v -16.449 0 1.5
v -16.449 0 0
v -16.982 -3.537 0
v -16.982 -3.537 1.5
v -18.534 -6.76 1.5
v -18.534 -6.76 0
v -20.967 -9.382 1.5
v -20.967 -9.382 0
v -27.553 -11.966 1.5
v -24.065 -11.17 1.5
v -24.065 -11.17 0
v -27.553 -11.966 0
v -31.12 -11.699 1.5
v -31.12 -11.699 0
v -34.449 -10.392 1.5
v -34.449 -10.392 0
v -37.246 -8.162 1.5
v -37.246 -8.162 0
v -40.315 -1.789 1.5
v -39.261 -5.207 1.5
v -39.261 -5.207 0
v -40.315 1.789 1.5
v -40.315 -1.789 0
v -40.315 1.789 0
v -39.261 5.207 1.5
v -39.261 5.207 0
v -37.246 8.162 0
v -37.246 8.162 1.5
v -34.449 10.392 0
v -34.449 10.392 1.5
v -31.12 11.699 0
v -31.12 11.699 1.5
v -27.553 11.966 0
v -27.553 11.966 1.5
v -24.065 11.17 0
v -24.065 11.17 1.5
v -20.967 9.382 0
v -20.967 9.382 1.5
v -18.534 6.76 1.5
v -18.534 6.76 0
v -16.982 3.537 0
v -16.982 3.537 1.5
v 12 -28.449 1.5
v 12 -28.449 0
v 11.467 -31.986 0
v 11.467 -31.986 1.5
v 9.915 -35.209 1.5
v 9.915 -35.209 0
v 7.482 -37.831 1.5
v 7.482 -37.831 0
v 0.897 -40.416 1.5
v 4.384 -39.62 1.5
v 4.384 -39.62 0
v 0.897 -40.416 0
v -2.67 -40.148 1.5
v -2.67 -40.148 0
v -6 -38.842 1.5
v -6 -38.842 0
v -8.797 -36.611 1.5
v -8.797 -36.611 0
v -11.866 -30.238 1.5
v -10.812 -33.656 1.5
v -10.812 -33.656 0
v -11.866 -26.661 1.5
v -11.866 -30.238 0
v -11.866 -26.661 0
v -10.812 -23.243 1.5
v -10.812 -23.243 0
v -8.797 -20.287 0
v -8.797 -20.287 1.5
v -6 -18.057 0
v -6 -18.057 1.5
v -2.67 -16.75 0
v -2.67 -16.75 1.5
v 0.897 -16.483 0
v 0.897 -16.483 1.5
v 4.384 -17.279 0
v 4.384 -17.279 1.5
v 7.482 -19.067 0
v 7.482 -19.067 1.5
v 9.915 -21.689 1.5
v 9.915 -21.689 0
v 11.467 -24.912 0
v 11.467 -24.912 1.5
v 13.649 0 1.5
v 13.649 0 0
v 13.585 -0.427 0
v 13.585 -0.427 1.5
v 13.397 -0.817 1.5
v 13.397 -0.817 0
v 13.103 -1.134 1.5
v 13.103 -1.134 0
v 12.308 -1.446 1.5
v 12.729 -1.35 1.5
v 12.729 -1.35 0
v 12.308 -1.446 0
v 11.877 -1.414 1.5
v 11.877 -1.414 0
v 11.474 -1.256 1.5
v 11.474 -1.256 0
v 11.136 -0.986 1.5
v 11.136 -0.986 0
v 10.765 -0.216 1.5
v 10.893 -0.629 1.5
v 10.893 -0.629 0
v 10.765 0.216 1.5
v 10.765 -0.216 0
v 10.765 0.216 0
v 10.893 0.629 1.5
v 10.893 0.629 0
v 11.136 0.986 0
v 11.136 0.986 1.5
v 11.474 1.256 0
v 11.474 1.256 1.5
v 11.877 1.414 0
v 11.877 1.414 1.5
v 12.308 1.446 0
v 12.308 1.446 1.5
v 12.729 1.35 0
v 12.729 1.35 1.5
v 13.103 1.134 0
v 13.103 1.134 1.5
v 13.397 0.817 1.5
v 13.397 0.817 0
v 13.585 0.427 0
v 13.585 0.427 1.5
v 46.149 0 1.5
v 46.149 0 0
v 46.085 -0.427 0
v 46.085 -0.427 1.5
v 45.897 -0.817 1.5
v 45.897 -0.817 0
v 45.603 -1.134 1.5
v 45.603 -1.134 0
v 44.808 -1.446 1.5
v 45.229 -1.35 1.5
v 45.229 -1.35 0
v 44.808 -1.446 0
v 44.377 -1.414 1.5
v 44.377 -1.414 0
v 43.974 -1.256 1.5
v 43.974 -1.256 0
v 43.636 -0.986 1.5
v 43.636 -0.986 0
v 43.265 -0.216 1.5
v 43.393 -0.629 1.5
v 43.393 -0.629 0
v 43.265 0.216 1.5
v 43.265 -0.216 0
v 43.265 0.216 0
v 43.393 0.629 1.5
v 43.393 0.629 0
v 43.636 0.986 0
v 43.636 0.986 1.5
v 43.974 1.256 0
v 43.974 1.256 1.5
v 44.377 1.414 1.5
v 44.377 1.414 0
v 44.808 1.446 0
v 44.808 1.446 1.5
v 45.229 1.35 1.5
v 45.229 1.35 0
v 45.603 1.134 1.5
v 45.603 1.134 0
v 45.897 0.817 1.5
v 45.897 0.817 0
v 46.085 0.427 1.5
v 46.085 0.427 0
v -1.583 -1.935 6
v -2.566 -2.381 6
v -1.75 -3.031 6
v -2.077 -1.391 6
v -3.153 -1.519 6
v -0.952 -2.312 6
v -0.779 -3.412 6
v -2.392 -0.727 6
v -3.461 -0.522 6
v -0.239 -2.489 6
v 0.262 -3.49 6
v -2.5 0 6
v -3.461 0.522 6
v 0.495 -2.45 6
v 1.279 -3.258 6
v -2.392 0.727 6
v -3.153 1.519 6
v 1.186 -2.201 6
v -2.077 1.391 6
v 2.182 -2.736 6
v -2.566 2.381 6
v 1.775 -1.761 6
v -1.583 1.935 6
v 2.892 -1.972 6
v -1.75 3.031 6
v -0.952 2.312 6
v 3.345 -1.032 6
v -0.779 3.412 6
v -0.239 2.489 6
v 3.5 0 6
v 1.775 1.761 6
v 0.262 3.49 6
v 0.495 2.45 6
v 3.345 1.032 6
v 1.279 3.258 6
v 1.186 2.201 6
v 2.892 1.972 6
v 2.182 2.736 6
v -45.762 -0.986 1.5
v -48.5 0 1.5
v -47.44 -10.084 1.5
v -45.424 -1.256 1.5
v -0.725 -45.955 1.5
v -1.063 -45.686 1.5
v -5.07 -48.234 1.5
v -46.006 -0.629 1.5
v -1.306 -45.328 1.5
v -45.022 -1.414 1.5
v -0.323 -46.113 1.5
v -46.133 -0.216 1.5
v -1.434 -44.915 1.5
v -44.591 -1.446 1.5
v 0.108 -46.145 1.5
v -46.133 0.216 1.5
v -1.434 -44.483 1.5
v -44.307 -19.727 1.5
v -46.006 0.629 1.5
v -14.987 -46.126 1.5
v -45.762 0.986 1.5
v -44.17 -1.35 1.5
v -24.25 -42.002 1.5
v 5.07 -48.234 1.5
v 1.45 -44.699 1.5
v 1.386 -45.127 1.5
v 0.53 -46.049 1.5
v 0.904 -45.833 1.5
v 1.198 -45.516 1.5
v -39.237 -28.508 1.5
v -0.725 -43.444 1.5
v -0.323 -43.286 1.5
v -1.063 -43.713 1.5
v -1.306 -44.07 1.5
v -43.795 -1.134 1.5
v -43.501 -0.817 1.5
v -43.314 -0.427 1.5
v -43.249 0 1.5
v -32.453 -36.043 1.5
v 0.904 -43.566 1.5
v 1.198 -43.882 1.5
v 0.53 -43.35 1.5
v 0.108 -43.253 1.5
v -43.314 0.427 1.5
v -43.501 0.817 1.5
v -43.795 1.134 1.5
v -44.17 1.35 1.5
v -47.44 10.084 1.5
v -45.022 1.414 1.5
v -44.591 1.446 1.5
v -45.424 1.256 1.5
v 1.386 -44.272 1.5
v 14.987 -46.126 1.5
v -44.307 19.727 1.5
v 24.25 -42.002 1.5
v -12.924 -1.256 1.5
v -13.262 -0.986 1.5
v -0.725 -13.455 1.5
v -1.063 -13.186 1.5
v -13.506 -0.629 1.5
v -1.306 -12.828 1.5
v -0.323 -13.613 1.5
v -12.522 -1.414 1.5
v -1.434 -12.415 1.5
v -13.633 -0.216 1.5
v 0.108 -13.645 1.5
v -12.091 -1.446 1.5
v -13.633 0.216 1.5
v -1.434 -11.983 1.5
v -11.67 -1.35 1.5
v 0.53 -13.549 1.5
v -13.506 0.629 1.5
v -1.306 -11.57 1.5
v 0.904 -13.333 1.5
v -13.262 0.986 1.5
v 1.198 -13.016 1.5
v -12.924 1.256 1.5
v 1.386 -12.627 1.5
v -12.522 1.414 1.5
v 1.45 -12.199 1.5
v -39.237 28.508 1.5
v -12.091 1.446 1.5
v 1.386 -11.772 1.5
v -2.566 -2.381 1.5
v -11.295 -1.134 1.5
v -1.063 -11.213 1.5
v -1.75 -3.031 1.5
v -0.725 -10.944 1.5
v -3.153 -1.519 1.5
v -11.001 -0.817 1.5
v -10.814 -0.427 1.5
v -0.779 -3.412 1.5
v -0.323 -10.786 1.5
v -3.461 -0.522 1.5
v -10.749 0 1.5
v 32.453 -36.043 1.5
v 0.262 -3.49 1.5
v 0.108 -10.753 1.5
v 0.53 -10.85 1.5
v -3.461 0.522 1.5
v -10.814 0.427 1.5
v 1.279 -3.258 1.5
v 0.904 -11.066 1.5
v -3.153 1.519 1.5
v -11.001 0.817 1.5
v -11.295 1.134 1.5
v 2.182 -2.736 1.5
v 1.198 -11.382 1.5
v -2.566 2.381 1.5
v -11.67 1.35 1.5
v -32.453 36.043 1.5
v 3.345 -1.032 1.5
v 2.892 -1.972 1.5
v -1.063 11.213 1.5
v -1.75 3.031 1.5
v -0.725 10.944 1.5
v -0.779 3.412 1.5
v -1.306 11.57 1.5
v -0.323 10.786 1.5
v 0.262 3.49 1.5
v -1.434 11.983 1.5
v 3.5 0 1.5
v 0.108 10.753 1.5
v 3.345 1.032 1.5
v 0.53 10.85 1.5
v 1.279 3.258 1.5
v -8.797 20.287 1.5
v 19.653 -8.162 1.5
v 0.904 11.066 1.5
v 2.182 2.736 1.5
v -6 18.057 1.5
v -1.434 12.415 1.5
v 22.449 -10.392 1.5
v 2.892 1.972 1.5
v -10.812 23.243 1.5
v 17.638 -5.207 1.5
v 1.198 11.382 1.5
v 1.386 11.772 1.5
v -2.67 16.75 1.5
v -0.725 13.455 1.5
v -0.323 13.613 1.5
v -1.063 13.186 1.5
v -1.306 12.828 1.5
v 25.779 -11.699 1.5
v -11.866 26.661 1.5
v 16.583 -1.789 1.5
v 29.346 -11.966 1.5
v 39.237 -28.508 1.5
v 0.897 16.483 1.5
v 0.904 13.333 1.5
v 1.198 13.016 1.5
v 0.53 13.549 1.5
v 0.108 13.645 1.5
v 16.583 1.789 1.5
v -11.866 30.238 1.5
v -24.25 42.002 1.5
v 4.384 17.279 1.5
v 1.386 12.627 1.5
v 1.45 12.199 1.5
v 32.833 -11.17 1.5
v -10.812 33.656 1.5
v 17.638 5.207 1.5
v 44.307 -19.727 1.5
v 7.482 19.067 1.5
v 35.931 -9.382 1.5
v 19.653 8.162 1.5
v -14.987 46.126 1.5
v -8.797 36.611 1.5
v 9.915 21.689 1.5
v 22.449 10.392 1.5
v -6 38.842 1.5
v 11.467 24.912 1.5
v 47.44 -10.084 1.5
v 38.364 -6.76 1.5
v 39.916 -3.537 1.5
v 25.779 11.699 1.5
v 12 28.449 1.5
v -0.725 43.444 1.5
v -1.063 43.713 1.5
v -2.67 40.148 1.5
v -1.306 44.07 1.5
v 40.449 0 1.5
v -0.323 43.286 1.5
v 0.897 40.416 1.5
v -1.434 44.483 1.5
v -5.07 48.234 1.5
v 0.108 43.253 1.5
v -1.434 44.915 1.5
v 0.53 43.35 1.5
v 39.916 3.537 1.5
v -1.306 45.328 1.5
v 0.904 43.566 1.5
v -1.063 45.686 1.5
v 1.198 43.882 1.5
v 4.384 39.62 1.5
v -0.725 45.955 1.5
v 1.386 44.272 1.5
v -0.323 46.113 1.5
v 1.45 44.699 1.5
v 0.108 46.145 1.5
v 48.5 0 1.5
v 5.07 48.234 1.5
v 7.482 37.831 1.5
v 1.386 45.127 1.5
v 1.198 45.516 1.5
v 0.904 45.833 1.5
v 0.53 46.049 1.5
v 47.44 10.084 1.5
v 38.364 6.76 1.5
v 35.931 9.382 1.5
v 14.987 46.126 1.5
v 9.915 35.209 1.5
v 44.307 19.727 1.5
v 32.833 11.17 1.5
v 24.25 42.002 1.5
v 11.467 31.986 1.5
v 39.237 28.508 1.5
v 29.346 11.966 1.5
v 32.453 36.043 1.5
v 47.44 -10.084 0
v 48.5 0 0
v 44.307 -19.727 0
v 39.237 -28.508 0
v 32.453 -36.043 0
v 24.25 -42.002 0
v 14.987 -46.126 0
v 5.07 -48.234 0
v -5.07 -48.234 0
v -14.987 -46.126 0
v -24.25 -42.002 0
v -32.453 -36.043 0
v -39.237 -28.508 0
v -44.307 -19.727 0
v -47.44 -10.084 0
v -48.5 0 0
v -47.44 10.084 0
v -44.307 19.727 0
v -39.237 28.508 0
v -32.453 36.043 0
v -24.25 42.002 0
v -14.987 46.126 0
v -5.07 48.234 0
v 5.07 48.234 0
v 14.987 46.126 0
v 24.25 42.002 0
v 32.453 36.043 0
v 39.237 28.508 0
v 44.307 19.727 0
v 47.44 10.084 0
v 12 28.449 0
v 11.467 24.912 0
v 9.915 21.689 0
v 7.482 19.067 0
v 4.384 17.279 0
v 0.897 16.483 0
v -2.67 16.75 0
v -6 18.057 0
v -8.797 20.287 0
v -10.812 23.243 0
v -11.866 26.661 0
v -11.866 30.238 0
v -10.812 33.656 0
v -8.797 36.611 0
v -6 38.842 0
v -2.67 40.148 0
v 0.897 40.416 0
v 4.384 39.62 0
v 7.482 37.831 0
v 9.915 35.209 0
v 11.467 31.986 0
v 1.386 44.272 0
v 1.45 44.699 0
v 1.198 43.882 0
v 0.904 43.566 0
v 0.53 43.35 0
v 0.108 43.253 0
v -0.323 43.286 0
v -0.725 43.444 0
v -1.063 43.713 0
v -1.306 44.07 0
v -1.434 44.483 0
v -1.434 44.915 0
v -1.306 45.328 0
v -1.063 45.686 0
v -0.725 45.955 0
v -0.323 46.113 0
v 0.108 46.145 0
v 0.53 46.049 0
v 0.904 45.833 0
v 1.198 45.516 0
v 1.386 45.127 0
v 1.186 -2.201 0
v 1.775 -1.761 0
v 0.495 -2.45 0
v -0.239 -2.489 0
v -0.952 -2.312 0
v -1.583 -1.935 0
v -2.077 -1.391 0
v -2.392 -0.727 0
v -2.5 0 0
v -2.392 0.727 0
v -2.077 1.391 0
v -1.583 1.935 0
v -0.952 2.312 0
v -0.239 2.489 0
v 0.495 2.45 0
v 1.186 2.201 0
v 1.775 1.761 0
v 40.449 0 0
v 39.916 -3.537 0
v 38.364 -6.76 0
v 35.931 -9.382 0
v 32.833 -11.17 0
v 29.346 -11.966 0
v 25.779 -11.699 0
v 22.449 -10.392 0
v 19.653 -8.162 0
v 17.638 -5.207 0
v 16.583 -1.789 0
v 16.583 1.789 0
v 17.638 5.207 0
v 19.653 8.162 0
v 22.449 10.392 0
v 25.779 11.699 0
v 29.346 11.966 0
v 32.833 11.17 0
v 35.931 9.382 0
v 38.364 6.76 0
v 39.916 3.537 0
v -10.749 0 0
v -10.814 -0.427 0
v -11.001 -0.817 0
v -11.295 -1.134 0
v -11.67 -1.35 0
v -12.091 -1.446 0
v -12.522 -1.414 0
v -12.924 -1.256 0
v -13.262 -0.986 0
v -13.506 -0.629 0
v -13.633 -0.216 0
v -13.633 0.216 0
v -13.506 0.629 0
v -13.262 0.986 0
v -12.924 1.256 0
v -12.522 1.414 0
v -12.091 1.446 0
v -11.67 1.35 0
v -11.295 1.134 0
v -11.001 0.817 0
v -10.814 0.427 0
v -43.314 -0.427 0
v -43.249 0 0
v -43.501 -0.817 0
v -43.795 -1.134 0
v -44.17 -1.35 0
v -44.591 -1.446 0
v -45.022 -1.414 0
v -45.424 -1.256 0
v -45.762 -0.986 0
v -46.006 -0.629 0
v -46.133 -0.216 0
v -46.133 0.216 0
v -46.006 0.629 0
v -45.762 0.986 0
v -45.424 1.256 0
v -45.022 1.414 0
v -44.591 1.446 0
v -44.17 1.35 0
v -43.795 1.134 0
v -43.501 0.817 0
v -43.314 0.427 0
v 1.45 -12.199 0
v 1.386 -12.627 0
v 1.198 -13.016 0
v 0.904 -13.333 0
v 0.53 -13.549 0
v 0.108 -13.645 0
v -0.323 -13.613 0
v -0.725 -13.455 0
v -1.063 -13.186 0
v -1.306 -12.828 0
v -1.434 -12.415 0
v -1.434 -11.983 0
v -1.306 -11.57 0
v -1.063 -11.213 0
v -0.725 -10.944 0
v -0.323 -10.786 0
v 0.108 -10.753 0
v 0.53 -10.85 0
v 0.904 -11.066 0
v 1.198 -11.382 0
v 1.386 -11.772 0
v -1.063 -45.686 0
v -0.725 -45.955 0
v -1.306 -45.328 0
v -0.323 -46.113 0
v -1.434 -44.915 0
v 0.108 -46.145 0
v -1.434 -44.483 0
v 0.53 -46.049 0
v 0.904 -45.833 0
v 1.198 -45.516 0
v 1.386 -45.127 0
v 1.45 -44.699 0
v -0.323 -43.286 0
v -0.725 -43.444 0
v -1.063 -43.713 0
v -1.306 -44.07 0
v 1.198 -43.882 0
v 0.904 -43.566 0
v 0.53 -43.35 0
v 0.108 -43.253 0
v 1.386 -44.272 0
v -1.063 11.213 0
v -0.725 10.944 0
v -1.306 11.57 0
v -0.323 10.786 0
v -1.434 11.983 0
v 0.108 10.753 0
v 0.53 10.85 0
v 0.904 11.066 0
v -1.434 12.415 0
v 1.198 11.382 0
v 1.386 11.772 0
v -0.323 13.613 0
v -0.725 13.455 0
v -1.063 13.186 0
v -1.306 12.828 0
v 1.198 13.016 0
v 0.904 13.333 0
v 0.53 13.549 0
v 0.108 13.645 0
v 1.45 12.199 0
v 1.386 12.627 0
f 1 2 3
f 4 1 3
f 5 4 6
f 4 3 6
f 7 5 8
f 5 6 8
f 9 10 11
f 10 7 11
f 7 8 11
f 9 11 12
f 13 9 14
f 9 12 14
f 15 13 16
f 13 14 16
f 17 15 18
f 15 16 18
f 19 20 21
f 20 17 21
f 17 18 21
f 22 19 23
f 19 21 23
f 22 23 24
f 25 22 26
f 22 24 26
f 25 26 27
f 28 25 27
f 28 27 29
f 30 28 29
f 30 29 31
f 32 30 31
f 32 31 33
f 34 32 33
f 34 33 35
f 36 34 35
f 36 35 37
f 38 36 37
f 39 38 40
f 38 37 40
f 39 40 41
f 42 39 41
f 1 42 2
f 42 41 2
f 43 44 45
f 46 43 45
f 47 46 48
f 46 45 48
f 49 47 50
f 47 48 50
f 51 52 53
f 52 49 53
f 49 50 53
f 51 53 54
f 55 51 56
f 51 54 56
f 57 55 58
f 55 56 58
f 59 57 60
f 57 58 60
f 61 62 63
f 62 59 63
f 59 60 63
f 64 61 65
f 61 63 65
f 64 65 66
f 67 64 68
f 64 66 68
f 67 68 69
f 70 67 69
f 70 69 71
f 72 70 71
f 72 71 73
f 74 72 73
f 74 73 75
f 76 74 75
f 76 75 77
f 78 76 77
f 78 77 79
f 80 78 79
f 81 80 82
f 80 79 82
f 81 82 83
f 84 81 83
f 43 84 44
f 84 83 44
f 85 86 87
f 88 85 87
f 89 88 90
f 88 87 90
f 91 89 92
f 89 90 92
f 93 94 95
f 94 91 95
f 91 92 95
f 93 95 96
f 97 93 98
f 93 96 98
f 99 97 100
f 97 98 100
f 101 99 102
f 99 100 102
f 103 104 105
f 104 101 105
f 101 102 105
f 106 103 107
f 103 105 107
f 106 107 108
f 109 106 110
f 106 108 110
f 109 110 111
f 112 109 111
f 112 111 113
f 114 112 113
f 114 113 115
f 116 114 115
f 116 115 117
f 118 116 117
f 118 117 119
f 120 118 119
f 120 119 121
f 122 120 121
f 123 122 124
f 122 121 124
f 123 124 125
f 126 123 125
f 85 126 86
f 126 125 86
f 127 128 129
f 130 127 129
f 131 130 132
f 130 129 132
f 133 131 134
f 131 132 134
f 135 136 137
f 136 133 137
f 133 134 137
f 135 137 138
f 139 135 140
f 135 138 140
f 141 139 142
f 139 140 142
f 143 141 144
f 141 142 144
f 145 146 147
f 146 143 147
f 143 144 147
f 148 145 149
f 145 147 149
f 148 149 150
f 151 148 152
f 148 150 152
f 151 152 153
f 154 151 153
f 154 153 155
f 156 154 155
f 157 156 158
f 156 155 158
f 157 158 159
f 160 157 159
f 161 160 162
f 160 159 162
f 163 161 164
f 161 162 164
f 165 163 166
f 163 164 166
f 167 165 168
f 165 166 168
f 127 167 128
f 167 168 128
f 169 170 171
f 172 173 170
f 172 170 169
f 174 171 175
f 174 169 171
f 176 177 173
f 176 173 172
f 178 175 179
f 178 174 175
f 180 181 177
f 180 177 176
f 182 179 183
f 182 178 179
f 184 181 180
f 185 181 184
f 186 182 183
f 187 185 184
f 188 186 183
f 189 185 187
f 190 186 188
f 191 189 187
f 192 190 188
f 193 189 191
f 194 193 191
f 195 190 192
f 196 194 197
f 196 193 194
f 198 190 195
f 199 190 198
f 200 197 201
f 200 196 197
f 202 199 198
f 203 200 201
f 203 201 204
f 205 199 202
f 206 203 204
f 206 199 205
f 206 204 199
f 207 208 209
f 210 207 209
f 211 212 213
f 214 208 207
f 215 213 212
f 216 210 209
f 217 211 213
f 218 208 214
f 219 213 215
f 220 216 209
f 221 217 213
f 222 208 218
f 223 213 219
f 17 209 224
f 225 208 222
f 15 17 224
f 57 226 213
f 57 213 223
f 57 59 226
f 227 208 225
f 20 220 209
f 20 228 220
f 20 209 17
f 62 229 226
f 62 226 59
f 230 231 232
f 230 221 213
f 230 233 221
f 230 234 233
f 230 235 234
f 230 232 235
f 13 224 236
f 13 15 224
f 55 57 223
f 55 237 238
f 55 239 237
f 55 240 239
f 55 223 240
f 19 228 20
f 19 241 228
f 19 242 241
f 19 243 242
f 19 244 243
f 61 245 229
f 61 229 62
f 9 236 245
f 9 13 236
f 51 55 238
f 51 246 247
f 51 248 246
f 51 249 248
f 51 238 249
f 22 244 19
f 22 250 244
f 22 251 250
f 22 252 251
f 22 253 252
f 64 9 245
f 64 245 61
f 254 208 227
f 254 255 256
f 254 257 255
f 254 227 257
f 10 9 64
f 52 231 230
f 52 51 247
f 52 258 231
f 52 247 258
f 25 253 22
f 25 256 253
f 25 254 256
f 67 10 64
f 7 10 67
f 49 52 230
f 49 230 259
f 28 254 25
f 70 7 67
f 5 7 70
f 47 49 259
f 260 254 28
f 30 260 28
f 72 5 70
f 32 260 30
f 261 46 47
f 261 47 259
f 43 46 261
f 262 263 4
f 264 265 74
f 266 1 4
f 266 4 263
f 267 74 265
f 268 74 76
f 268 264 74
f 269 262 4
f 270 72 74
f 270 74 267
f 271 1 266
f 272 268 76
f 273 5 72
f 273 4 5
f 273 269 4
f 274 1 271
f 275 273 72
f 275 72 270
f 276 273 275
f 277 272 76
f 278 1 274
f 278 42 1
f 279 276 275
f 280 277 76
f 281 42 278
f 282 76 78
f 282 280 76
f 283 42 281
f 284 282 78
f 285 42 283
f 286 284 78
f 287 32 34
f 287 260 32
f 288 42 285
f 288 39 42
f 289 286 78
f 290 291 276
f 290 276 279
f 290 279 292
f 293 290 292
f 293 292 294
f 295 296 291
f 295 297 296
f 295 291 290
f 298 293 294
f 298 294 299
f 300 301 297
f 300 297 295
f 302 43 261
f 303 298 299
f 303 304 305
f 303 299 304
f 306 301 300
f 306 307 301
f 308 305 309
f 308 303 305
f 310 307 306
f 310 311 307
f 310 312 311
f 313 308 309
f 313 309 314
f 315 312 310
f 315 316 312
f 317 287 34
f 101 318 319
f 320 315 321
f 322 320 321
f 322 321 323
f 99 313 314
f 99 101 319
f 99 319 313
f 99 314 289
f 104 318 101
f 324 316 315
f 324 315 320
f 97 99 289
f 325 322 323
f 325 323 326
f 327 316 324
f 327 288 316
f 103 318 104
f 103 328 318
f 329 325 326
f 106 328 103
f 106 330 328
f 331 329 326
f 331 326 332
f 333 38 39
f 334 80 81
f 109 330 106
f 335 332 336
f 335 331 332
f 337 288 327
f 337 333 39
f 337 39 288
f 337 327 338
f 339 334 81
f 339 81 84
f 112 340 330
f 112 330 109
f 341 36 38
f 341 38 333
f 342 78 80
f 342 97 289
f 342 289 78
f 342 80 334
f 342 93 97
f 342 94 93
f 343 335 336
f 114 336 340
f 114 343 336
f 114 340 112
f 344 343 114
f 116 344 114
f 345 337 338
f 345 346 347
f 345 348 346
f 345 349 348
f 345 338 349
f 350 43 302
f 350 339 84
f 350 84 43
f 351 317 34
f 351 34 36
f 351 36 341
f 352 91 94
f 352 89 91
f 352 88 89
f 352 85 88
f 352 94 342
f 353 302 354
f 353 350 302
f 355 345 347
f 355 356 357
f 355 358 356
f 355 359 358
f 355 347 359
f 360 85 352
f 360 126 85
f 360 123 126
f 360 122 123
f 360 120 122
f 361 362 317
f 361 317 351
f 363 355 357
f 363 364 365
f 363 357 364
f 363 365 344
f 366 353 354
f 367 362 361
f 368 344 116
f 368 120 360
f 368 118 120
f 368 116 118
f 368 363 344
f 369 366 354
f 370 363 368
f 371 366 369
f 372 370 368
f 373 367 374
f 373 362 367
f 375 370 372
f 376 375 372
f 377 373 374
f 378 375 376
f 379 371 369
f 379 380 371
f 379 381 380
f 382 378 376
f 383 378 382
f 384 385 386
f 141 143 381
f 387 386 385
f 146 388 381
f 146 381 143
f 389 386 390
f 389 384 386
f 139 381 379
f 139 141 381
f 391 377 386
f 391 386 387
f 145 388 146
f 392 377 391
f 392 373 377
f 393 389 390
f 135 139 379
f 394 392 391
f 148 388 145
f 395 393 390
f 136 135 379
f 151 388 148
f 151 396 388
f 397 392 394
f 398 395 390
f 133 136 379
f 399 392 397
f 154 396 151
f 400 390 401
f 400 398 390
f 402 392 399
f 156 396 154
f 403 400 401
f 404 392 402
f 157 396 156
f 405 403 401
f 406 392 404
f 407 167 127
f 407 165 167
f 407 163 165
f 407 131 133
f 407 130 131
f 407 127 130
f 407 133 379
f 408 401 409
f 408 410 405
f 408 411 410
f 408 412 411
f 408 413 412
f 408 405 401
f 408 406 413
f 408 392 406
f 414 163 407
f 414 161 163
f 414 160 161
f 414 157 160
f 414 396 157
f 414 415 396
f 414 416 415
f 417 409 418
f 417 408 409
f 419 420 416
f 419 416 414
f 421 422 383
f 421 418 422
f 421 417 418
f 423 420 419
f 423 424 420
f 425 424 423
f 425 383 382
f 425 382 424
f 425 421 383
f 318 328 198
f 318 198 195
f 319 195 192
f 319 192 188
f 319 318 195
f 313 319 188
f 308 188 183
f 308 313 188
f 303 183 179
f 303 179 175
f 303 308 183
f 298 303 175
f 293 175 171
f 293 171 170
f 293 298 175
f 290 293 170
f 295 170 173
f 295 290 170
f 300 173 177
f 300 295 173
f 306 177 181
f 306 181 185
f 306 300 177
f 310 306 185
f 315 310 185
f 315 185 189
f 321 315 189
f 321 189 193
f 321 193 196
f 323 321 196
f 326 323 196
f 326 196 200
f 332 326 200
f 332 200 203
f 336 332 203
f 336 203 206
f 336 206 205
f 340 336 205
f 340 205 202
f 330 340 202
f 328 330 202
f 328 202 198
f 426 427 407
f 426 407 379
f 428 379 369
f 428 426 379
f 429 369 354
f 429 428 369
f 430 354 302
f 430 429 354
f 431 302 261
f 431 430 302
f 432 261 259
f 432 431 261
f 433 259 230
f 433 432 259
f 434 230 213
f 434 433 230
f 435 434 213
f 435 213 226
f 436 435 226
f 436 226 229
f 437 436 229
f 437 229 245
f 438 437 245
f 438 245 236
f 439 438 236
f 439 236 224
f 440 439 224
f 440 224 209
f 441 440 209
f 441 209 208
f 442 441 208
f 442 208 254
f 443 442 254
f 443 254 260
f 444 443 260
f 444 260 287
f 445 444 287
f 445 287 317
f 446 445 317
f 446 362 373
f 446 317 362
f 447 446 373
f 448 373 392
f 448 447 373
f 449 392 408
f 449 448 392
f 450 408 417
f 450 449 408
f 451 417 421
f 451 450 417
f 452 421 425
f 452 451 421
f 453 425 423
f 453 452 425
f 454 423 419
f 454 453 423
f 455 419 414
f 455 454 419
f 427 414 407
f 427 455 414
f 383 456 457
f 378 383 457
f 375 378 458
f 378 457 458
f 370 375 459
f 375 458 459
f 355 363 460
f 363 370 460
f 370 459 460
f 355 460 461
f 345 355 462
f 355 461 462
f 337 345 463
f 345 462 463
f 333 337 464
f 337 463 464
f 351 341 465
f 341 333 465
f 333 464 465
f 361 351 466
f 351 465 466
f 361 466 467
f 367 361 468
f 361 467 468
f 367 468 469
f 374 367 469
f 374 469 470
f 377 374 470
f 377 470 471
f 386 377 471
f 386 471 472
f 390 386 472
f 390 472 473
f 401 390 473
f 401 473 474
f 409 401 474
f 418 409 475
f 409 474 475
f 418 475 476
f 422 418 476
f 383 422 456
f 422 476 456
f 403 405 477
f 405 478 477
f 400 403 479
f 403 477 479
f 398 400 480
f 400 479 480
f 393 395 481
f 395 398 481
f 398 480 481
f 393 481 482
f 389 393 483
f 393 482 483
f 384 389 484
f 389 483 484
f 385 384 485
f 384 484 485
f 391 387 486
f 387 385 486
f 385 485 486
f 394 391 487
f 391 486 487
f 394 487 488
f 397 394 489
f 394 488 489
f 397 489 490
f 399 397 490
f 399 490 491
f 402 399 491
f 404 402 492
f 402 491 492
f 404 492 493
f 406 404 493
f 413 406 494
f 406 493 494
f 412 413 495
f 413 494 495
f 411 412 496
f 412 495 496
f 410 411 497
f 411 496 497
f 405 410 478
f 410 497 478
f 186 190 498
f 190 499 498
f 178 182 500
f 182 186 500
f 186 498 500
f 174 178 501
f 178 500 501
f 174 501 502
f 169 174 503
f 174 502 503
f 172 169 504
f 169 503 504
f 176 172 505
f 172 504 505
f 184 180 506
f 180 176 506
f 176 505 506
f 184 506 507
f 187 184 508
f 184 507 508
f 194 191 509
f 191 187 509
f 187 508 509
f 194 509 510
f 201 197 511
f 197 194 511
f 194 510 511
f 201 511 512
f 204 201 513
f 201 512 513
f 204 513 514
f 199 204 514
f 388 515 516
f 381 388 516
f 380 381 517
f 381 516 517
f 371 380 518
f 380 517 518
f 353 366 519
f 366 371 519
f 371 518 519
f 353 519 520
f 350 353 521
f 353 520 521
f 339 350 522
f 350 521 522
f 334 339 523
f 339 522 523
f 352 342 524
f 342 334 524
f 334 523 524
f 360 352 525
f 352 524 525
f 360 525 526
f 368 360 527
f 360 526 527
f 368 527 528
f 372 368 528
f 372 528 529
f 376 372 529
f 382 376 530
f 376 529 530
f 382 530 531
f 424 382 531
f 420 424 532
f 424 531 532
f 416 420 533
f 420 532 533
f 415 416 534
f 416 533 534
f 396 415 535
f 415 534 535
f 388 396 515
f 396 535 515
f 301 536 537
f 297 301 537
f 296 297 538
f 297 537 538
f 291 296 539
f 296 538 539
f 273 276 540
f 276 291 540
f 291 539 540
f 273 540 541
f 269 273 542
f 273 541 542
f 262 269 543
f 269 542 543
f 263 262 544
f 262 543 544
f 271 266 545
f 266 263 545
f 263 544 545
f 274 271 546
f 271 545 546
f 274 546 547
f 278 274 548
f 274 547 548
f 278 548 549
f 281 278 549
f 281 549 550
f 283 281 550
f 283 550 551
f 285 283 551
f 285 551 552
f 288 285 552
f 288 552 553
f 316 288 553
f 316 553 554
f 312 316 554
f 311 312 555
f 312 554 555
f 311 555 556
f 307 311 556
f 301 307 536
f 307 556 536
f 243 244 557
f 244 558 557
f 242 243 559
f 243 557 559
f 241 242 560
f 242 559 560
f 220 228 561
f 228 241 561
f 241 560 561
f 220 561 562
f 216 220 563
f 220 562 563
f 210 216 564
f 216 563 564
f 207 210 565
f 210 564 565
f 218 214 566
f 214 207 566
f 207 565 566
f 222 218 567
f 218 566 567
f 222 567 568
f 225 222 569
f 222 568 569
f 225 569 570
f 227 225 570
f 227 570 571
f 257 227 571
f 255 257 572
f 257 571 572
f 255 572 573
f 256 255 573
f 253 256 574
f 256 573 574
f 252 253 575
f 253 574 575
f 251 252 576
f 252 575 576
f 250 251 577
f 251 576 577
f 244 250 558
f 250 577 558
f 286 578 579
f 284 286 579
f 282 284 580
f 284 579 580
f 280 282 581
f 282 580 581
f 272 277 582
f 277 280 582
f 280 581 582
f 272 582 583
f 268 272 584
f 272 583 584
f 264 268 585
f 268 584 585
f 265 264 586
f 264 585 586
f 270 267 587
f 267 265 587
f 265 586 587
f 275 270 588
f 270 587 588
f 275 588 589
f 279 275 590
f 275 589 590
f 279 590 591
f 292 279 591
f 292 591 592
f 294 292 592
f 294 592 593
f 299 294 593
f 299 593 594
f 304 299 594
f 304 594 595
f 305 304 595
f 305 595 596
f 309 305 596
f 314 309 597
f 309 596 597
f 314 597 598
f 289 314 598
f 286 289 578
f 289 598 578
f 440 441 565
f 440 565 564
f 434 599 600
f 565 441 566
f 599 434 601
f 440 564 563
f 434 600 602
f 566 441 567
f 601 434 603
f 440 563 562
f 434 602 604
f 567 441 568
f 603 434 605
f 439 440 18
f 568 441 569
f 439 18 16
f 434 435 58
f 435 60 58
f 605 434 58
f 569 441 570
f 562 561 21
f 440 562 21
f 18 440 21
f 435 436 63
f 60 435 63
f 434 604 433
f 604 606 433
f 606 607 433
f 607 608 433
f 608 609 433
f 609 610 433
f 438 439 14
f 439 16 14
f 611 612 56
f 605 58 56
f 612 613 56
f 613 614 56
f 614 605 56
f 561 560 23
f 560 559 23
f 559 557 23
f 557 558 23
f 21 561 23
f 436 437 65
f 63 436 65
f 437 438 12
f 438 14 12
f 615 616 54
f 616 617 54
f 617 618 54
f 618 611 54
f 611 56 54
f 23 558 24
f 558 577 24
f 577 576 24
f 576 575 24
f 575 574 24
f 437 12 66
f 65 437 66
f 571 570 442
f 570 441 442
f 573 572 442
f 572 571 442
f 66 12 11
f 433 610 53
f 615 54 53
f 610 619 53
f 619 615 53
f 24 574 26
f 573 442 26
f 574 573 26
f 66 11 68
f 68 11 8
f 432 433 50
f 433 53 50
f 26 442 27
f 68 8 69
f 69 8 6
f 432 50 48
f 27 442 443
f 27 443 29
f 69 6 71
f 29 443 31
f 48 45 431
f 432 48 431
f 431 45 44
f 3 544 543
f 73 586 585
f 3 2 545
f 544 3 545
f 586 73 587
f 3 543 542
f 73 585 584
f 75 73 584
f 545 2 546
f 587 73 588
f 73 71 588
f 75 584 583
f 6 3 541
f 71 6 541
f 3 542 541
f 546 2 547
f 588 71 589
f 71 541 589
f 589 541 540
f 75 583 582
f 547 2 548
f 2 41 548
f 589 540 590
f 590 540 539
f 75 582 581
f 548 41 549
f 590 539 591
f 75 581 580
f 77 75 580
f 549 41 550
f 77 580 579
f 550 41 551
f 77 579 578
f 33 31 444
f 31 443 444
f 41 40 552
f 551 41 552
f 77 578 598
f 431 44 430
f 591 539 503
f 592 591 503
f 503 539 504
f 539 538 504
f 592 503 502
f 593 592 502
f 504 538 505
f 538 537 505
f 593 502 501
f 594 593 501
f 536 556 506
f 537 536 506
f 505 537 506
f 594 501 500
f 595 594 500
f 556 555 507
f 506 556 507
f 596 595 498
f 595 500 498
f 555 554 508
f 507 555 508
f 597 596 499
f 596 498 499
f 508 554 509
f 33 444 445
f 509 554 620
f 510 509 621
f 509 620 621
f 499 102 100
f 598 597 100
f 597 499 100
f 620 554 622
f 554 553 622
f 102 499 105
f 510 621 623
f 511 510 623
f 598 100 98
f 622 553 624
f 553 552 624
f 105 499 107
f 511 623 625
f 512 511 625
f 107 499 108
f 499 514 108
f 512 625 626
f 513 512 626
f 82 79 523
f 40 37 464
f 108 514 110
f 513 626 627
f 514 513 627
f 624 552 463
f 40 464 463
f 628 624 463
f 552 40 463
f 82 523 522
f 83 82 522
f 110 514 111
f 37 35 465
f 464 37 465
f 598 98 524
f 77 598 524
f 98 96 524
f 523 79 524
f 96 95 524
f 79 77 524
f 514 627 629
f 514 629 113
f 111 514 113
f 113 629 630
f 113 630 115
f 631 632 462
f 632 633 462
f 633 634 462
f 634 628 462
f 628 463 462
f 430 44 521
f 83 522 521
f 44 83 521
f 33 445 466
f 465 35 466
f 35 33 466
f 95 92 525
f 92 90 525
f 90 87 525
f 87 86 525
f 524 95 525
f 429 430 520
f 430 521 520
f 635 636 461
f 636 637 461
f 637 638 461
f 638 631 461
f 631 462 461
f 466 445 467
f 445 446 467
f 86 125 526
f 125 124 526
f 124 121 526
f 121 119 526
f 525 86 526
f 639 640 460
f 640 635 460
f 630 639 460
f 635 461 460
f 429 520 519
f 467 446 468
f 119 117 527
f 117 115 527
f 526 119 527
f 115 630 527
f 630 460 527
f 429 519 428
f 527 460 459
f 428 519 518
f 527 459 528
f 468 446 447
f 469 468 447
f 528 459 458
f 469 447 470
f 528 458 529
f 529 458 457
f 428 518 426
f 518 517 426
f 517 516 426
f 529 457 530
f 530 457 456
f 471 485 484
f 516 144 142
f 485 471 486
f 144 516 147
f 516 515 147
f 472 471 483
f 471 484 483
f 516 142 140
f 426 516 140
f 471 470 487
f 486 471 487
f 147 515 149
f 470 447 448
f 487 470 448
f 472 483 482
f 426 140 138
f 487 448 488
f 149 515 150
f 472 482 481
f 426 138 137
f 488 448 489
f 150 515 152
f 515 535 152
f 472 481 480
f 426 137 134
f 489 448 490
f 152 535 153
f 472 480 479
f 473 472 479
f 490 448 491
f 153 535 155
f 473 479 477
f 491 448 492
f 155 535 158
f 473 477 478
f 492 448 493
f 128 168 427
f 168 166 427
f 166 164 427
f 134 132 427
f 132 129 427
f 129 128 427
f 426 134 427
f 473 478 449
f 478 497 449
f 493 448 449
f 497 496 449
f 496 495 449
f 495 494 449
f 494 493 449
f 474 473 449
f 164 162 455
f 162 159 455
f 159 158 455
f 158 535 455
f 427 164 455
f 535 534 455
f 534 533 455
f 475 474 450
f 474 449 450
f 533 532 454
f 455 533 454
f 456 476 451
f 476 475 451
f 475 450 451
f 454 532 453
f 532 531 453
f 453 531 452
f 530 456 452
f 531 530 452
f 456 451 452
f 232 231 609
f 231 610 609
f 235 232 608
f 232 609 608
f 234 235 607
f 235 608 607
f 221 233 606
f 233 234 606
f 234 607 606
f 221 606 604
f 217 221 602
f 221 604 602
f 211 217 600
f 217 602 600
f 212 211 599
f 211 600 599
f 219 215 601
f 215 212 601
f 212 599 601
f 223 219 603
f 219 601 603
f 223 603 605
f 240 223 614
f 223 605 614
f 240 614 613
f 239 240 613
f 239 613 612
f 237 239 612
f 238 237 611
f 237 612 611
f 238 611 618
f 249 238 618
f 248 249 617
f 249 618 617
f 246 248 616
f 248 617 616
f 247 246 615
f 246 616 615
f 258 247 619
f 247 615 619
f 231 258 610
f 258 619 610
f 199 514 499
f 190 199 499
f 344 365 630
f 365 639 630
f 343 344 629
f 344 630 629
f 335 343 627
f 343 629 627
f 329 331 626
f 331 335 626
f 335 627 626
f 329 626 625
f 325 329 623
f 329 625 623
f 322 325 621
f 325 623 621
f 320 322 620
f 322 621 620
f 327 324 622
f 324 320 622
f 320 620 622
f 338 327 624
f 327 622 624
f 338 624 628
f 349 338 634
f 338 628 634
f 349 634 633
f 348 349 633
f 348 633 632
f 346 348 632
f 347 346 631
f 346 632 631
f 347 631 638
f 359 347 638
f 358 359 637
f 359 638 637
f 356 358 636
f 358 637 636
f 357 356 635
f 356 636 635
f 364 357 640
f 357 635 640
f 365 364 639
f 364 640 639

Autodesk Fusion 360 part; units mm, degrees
sketch "Sketch1" plane through (0, 0, 0) normal (0, 0, 1) x (1, 0, 0)
  circle A0 centre (0, 0) radius 2.5
  circle A1 centre (0, 0) radius 1.775
  circle A2 centre (0, 0) radius 3.5
  line L0 (1.775, 0) -> (1.775, 3.0165)
  line L1 (1.775, 0) -> (1.775, -3.0165)
  circle A3 centre (0, 0) radius 48.5
  circle A4 centre (0, 44.6993) radius 1.45
  circle A5 centre (0, 44.6993) radius 1.45
  circle A6 centre (0, 12.1993) radius 1.45
  circle A7 centre (0, 28.4493) radius 12
  circle A8 centre (-44.6993, 0) radius 1.45
  circle A9 centre (-28.4493, 0) radius 12
  circle A10 centre (-12.1993, 0) radius 1.45
  circle A11 centre (0, -44.6993) radius 1.45
  circle A12 centre (0, -28.4493) radius 12
  circle A13 centre (0, -12.1993) radius 1.45
  circle A14 centre (44.6993, 0) radius 1.45
  circle A15 centre (28.4493, 0) radius 12
  circle A16 centre (12.1993, 0) radius 1.45
  point P0 (0, 47.6993)
  point P1 (0, 28.4493)
  dimension "d1" = 5
  dimension "d3" = 3.55
  dimension "d4" = 7
  dimension "d5" = 97
  dimension "d7" = 2.9
  dimension "d8" = 32.5
  dimension "d9" = 2.9
  dimension "d10" = 2.9
  dimension "d11" = 24
  dimension "d13" = 360
extrude "Extrude4" add sketch "Sketch1" along normal blind 6 contours A0 L0 L1 | A0 A2 L0 L1 | A0 A2 L0 L1 picked at (2.2513, 0.1082) makes body 1
extrude "Extrude3" add sketch "Sketch1" along normal blind 2 separate body contours A0 L0 L1 | A0 A2 L0 L1 | A0 A2 L0 L1 picked at (2.2513, 0.1082) makes body 2
extrude "Extrude5" add sketch "Sketch1" along normal blind 1.5 contours A3 bodies 1 2
